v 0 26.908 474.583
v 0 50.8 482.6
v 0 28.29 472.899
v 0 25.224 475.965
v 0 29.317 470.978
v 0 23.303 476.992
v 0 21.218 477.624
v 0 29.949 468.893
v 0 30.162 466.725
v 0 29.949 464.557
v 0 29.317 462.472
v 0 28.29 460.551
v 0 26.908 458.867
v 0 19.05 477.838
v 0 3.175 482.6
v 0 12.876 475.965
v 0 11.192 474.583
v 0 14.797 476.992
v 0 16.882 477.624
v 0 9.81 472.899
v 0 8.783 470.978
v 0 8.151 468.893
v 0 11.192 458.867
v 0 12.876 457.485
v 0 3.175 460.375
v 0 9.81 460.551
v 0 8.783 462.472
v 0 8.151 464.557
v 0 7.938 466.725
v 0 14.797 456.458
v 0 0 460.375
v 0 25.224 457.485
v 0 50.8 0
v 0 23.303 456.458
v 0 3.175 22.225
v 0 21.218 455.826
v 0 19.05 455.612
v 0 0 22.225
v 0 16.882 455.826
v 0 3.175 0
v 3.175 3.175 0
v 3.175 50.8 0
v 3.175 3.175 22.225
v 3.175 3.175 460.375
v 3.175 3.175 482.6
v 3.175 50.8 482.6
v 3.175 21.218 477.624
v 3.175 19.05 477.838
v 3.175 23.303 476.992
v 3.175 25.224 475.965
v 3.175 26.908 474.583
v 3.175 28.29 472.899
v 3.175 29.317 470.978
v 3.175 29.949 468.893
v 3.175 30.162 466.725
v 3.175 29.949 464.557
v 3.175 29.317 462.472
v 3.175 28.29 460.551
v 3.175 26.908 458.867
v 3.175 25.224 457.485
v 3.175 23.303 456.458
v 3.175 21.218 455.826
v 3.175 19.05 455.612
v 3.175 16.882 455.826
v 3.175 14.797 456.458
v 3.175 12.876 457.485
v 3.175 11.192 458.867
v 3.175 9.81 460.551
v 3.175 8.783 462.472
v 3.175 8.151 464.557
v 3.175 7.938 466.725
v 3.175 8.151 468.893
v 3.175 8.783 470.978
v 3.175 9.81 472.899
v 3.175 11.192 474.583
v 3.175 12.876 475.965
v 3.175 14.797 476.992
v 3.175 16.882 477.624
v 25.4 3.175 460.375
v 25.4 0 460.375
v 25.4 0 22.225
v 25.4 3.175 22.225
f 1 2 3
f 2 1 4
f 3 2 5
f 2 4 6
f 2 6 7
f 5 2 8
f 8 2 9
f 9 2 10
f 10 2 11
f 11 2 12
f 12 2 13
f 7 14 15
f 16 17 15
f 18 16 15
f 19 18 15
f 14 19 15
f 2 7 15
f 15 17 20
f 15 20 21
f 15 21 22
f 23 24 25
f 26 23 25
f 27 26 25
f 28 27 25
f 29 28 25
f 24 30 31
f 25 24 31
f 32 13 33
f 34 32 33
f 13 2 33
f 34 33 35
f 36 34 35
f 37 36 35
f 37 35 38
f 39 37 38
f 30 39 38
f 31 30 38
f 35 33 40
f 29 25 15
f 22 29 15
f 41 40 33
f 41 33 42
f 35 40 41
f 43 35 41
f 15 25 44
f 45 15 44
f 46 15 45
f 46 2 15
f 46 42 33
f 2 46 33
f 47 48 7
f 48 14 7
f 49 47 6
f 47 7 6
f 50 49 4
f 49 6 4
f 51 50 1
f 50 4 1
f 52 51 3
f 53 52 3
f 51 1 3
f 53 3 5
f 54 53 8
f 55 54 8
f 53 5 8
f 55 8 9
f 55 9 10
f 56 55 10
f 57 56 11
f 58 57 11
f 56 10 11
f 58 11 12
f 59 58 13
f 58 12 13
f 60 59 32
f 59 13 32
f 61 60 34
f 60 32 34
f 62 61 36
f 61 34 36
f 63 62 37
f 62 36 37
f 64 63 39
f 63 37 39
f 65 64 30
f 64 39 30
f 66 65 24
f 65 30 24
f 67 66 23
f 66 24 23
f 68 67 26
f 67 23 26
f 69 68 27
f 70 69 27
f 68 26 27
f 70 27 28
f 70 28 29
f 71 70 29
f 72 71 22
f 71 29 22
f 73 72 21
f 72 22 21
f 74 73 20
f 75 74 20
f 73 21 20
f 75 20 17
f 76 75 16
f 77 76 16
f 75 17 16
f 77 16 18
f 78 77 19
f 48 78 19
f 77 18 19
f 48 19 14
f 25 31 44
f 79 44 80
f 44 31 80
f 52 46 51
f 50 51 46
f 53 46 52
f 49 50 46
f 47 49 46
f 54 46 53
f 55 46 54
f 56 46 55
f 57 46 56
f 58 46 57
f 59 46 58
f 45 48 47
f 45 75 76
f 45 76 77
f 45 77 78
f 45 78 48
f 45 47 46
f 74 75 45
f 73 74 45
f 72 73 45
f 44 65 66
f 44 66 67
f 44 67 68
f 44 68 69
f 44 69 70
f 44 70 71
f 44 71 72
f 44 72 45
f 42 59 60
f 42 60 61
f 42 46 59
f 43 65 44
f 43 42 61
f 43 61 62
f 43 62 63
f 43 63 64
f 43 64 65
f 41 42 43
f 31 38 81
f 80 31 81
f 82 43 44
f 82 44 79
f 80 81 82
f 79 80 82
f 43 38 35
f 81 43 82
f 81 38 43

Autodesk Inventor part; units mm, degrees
ref_plane "YZ Plane" through (0, 0, 0) normal (1, 0, 0) x (0, 1, 0)
ref_plane "XZ Plane" through (0, 0, 0) normal (0, 1, 0) x (-1, 0, 0)
ref_plane "XY Plane" through (0, 0, 0) normal (0, 0, 1) x (1, 0, 0)
sketch "Sketch1" plane through (0, 0, 0) normal (0, 0, 1) x (1, 0, 0)
  line L0 (0, 0) -> (25.4, 0)
  line L1 (25.4, 0) -> (25.4, 3.175)
  line L2 (3.175, 50.8) -> (0, 50.8)
  line L3 (0, 50.8) -> (0, 0)
  line L4 (3.175, 50.8) -> (3.175, 3.175)
  line L5 (3.175, 3.175) -> (25.4, 3.175)
  dimension "d0" = 50.8
  dimension "d1" = 25.4
  dimension "d2" = 3.175
  dimension "d3" = 3.175
extrude "Extrusion1" add sketch "Sketch1" along normal blind 482.6
sketch "Sketch2" plane through (0, 0, 0) normal (-1, 0, 0) x (0, 0, 1)
  line L0 (482.6, 0) -> (482.6, 50.8) projected
  line L1 (0, 0) -> (482.6, 0) projected
  circle A0 centre (466.725, 19.05) radius 11.1125
  dimension "d6" = 22.225
  dimension "d7" = 19.05
  dimension "d8" = 15.875
extrude "Extrusion2" cut sketch "Sketch2" against normal blind 508
sketch "Sketch3" plane through (0, 0, 0) normal (0, -1, 0) x (1, 0, 0)
  line L0 (0, 0) -> (0, 482.6) projected
  line L1 (0, 0) -> (25.4, 0) projected
  line L2 (25.4, 0) -> (25.4, 482.6) projected
  line L3 (0, 22.225) -> (25.4, 22.225)
  line L4 (25.4, 482.6) -> (0, 482.6) projected
  line L5 (0, 460.375) -> (25.4, 460.375)
  dimension "d13" = 22.225
  dimension "d16" = 22.225
extrude "Extrusion3" cut sketch "Sketch3" against normal blind 3.175 contours L0 L3 L2 L1 | L0 L4 L2 L5
equation "\"d3\" = d2"
equation "\"d16\" = d13"
properties part number "manipulator L frame right"
